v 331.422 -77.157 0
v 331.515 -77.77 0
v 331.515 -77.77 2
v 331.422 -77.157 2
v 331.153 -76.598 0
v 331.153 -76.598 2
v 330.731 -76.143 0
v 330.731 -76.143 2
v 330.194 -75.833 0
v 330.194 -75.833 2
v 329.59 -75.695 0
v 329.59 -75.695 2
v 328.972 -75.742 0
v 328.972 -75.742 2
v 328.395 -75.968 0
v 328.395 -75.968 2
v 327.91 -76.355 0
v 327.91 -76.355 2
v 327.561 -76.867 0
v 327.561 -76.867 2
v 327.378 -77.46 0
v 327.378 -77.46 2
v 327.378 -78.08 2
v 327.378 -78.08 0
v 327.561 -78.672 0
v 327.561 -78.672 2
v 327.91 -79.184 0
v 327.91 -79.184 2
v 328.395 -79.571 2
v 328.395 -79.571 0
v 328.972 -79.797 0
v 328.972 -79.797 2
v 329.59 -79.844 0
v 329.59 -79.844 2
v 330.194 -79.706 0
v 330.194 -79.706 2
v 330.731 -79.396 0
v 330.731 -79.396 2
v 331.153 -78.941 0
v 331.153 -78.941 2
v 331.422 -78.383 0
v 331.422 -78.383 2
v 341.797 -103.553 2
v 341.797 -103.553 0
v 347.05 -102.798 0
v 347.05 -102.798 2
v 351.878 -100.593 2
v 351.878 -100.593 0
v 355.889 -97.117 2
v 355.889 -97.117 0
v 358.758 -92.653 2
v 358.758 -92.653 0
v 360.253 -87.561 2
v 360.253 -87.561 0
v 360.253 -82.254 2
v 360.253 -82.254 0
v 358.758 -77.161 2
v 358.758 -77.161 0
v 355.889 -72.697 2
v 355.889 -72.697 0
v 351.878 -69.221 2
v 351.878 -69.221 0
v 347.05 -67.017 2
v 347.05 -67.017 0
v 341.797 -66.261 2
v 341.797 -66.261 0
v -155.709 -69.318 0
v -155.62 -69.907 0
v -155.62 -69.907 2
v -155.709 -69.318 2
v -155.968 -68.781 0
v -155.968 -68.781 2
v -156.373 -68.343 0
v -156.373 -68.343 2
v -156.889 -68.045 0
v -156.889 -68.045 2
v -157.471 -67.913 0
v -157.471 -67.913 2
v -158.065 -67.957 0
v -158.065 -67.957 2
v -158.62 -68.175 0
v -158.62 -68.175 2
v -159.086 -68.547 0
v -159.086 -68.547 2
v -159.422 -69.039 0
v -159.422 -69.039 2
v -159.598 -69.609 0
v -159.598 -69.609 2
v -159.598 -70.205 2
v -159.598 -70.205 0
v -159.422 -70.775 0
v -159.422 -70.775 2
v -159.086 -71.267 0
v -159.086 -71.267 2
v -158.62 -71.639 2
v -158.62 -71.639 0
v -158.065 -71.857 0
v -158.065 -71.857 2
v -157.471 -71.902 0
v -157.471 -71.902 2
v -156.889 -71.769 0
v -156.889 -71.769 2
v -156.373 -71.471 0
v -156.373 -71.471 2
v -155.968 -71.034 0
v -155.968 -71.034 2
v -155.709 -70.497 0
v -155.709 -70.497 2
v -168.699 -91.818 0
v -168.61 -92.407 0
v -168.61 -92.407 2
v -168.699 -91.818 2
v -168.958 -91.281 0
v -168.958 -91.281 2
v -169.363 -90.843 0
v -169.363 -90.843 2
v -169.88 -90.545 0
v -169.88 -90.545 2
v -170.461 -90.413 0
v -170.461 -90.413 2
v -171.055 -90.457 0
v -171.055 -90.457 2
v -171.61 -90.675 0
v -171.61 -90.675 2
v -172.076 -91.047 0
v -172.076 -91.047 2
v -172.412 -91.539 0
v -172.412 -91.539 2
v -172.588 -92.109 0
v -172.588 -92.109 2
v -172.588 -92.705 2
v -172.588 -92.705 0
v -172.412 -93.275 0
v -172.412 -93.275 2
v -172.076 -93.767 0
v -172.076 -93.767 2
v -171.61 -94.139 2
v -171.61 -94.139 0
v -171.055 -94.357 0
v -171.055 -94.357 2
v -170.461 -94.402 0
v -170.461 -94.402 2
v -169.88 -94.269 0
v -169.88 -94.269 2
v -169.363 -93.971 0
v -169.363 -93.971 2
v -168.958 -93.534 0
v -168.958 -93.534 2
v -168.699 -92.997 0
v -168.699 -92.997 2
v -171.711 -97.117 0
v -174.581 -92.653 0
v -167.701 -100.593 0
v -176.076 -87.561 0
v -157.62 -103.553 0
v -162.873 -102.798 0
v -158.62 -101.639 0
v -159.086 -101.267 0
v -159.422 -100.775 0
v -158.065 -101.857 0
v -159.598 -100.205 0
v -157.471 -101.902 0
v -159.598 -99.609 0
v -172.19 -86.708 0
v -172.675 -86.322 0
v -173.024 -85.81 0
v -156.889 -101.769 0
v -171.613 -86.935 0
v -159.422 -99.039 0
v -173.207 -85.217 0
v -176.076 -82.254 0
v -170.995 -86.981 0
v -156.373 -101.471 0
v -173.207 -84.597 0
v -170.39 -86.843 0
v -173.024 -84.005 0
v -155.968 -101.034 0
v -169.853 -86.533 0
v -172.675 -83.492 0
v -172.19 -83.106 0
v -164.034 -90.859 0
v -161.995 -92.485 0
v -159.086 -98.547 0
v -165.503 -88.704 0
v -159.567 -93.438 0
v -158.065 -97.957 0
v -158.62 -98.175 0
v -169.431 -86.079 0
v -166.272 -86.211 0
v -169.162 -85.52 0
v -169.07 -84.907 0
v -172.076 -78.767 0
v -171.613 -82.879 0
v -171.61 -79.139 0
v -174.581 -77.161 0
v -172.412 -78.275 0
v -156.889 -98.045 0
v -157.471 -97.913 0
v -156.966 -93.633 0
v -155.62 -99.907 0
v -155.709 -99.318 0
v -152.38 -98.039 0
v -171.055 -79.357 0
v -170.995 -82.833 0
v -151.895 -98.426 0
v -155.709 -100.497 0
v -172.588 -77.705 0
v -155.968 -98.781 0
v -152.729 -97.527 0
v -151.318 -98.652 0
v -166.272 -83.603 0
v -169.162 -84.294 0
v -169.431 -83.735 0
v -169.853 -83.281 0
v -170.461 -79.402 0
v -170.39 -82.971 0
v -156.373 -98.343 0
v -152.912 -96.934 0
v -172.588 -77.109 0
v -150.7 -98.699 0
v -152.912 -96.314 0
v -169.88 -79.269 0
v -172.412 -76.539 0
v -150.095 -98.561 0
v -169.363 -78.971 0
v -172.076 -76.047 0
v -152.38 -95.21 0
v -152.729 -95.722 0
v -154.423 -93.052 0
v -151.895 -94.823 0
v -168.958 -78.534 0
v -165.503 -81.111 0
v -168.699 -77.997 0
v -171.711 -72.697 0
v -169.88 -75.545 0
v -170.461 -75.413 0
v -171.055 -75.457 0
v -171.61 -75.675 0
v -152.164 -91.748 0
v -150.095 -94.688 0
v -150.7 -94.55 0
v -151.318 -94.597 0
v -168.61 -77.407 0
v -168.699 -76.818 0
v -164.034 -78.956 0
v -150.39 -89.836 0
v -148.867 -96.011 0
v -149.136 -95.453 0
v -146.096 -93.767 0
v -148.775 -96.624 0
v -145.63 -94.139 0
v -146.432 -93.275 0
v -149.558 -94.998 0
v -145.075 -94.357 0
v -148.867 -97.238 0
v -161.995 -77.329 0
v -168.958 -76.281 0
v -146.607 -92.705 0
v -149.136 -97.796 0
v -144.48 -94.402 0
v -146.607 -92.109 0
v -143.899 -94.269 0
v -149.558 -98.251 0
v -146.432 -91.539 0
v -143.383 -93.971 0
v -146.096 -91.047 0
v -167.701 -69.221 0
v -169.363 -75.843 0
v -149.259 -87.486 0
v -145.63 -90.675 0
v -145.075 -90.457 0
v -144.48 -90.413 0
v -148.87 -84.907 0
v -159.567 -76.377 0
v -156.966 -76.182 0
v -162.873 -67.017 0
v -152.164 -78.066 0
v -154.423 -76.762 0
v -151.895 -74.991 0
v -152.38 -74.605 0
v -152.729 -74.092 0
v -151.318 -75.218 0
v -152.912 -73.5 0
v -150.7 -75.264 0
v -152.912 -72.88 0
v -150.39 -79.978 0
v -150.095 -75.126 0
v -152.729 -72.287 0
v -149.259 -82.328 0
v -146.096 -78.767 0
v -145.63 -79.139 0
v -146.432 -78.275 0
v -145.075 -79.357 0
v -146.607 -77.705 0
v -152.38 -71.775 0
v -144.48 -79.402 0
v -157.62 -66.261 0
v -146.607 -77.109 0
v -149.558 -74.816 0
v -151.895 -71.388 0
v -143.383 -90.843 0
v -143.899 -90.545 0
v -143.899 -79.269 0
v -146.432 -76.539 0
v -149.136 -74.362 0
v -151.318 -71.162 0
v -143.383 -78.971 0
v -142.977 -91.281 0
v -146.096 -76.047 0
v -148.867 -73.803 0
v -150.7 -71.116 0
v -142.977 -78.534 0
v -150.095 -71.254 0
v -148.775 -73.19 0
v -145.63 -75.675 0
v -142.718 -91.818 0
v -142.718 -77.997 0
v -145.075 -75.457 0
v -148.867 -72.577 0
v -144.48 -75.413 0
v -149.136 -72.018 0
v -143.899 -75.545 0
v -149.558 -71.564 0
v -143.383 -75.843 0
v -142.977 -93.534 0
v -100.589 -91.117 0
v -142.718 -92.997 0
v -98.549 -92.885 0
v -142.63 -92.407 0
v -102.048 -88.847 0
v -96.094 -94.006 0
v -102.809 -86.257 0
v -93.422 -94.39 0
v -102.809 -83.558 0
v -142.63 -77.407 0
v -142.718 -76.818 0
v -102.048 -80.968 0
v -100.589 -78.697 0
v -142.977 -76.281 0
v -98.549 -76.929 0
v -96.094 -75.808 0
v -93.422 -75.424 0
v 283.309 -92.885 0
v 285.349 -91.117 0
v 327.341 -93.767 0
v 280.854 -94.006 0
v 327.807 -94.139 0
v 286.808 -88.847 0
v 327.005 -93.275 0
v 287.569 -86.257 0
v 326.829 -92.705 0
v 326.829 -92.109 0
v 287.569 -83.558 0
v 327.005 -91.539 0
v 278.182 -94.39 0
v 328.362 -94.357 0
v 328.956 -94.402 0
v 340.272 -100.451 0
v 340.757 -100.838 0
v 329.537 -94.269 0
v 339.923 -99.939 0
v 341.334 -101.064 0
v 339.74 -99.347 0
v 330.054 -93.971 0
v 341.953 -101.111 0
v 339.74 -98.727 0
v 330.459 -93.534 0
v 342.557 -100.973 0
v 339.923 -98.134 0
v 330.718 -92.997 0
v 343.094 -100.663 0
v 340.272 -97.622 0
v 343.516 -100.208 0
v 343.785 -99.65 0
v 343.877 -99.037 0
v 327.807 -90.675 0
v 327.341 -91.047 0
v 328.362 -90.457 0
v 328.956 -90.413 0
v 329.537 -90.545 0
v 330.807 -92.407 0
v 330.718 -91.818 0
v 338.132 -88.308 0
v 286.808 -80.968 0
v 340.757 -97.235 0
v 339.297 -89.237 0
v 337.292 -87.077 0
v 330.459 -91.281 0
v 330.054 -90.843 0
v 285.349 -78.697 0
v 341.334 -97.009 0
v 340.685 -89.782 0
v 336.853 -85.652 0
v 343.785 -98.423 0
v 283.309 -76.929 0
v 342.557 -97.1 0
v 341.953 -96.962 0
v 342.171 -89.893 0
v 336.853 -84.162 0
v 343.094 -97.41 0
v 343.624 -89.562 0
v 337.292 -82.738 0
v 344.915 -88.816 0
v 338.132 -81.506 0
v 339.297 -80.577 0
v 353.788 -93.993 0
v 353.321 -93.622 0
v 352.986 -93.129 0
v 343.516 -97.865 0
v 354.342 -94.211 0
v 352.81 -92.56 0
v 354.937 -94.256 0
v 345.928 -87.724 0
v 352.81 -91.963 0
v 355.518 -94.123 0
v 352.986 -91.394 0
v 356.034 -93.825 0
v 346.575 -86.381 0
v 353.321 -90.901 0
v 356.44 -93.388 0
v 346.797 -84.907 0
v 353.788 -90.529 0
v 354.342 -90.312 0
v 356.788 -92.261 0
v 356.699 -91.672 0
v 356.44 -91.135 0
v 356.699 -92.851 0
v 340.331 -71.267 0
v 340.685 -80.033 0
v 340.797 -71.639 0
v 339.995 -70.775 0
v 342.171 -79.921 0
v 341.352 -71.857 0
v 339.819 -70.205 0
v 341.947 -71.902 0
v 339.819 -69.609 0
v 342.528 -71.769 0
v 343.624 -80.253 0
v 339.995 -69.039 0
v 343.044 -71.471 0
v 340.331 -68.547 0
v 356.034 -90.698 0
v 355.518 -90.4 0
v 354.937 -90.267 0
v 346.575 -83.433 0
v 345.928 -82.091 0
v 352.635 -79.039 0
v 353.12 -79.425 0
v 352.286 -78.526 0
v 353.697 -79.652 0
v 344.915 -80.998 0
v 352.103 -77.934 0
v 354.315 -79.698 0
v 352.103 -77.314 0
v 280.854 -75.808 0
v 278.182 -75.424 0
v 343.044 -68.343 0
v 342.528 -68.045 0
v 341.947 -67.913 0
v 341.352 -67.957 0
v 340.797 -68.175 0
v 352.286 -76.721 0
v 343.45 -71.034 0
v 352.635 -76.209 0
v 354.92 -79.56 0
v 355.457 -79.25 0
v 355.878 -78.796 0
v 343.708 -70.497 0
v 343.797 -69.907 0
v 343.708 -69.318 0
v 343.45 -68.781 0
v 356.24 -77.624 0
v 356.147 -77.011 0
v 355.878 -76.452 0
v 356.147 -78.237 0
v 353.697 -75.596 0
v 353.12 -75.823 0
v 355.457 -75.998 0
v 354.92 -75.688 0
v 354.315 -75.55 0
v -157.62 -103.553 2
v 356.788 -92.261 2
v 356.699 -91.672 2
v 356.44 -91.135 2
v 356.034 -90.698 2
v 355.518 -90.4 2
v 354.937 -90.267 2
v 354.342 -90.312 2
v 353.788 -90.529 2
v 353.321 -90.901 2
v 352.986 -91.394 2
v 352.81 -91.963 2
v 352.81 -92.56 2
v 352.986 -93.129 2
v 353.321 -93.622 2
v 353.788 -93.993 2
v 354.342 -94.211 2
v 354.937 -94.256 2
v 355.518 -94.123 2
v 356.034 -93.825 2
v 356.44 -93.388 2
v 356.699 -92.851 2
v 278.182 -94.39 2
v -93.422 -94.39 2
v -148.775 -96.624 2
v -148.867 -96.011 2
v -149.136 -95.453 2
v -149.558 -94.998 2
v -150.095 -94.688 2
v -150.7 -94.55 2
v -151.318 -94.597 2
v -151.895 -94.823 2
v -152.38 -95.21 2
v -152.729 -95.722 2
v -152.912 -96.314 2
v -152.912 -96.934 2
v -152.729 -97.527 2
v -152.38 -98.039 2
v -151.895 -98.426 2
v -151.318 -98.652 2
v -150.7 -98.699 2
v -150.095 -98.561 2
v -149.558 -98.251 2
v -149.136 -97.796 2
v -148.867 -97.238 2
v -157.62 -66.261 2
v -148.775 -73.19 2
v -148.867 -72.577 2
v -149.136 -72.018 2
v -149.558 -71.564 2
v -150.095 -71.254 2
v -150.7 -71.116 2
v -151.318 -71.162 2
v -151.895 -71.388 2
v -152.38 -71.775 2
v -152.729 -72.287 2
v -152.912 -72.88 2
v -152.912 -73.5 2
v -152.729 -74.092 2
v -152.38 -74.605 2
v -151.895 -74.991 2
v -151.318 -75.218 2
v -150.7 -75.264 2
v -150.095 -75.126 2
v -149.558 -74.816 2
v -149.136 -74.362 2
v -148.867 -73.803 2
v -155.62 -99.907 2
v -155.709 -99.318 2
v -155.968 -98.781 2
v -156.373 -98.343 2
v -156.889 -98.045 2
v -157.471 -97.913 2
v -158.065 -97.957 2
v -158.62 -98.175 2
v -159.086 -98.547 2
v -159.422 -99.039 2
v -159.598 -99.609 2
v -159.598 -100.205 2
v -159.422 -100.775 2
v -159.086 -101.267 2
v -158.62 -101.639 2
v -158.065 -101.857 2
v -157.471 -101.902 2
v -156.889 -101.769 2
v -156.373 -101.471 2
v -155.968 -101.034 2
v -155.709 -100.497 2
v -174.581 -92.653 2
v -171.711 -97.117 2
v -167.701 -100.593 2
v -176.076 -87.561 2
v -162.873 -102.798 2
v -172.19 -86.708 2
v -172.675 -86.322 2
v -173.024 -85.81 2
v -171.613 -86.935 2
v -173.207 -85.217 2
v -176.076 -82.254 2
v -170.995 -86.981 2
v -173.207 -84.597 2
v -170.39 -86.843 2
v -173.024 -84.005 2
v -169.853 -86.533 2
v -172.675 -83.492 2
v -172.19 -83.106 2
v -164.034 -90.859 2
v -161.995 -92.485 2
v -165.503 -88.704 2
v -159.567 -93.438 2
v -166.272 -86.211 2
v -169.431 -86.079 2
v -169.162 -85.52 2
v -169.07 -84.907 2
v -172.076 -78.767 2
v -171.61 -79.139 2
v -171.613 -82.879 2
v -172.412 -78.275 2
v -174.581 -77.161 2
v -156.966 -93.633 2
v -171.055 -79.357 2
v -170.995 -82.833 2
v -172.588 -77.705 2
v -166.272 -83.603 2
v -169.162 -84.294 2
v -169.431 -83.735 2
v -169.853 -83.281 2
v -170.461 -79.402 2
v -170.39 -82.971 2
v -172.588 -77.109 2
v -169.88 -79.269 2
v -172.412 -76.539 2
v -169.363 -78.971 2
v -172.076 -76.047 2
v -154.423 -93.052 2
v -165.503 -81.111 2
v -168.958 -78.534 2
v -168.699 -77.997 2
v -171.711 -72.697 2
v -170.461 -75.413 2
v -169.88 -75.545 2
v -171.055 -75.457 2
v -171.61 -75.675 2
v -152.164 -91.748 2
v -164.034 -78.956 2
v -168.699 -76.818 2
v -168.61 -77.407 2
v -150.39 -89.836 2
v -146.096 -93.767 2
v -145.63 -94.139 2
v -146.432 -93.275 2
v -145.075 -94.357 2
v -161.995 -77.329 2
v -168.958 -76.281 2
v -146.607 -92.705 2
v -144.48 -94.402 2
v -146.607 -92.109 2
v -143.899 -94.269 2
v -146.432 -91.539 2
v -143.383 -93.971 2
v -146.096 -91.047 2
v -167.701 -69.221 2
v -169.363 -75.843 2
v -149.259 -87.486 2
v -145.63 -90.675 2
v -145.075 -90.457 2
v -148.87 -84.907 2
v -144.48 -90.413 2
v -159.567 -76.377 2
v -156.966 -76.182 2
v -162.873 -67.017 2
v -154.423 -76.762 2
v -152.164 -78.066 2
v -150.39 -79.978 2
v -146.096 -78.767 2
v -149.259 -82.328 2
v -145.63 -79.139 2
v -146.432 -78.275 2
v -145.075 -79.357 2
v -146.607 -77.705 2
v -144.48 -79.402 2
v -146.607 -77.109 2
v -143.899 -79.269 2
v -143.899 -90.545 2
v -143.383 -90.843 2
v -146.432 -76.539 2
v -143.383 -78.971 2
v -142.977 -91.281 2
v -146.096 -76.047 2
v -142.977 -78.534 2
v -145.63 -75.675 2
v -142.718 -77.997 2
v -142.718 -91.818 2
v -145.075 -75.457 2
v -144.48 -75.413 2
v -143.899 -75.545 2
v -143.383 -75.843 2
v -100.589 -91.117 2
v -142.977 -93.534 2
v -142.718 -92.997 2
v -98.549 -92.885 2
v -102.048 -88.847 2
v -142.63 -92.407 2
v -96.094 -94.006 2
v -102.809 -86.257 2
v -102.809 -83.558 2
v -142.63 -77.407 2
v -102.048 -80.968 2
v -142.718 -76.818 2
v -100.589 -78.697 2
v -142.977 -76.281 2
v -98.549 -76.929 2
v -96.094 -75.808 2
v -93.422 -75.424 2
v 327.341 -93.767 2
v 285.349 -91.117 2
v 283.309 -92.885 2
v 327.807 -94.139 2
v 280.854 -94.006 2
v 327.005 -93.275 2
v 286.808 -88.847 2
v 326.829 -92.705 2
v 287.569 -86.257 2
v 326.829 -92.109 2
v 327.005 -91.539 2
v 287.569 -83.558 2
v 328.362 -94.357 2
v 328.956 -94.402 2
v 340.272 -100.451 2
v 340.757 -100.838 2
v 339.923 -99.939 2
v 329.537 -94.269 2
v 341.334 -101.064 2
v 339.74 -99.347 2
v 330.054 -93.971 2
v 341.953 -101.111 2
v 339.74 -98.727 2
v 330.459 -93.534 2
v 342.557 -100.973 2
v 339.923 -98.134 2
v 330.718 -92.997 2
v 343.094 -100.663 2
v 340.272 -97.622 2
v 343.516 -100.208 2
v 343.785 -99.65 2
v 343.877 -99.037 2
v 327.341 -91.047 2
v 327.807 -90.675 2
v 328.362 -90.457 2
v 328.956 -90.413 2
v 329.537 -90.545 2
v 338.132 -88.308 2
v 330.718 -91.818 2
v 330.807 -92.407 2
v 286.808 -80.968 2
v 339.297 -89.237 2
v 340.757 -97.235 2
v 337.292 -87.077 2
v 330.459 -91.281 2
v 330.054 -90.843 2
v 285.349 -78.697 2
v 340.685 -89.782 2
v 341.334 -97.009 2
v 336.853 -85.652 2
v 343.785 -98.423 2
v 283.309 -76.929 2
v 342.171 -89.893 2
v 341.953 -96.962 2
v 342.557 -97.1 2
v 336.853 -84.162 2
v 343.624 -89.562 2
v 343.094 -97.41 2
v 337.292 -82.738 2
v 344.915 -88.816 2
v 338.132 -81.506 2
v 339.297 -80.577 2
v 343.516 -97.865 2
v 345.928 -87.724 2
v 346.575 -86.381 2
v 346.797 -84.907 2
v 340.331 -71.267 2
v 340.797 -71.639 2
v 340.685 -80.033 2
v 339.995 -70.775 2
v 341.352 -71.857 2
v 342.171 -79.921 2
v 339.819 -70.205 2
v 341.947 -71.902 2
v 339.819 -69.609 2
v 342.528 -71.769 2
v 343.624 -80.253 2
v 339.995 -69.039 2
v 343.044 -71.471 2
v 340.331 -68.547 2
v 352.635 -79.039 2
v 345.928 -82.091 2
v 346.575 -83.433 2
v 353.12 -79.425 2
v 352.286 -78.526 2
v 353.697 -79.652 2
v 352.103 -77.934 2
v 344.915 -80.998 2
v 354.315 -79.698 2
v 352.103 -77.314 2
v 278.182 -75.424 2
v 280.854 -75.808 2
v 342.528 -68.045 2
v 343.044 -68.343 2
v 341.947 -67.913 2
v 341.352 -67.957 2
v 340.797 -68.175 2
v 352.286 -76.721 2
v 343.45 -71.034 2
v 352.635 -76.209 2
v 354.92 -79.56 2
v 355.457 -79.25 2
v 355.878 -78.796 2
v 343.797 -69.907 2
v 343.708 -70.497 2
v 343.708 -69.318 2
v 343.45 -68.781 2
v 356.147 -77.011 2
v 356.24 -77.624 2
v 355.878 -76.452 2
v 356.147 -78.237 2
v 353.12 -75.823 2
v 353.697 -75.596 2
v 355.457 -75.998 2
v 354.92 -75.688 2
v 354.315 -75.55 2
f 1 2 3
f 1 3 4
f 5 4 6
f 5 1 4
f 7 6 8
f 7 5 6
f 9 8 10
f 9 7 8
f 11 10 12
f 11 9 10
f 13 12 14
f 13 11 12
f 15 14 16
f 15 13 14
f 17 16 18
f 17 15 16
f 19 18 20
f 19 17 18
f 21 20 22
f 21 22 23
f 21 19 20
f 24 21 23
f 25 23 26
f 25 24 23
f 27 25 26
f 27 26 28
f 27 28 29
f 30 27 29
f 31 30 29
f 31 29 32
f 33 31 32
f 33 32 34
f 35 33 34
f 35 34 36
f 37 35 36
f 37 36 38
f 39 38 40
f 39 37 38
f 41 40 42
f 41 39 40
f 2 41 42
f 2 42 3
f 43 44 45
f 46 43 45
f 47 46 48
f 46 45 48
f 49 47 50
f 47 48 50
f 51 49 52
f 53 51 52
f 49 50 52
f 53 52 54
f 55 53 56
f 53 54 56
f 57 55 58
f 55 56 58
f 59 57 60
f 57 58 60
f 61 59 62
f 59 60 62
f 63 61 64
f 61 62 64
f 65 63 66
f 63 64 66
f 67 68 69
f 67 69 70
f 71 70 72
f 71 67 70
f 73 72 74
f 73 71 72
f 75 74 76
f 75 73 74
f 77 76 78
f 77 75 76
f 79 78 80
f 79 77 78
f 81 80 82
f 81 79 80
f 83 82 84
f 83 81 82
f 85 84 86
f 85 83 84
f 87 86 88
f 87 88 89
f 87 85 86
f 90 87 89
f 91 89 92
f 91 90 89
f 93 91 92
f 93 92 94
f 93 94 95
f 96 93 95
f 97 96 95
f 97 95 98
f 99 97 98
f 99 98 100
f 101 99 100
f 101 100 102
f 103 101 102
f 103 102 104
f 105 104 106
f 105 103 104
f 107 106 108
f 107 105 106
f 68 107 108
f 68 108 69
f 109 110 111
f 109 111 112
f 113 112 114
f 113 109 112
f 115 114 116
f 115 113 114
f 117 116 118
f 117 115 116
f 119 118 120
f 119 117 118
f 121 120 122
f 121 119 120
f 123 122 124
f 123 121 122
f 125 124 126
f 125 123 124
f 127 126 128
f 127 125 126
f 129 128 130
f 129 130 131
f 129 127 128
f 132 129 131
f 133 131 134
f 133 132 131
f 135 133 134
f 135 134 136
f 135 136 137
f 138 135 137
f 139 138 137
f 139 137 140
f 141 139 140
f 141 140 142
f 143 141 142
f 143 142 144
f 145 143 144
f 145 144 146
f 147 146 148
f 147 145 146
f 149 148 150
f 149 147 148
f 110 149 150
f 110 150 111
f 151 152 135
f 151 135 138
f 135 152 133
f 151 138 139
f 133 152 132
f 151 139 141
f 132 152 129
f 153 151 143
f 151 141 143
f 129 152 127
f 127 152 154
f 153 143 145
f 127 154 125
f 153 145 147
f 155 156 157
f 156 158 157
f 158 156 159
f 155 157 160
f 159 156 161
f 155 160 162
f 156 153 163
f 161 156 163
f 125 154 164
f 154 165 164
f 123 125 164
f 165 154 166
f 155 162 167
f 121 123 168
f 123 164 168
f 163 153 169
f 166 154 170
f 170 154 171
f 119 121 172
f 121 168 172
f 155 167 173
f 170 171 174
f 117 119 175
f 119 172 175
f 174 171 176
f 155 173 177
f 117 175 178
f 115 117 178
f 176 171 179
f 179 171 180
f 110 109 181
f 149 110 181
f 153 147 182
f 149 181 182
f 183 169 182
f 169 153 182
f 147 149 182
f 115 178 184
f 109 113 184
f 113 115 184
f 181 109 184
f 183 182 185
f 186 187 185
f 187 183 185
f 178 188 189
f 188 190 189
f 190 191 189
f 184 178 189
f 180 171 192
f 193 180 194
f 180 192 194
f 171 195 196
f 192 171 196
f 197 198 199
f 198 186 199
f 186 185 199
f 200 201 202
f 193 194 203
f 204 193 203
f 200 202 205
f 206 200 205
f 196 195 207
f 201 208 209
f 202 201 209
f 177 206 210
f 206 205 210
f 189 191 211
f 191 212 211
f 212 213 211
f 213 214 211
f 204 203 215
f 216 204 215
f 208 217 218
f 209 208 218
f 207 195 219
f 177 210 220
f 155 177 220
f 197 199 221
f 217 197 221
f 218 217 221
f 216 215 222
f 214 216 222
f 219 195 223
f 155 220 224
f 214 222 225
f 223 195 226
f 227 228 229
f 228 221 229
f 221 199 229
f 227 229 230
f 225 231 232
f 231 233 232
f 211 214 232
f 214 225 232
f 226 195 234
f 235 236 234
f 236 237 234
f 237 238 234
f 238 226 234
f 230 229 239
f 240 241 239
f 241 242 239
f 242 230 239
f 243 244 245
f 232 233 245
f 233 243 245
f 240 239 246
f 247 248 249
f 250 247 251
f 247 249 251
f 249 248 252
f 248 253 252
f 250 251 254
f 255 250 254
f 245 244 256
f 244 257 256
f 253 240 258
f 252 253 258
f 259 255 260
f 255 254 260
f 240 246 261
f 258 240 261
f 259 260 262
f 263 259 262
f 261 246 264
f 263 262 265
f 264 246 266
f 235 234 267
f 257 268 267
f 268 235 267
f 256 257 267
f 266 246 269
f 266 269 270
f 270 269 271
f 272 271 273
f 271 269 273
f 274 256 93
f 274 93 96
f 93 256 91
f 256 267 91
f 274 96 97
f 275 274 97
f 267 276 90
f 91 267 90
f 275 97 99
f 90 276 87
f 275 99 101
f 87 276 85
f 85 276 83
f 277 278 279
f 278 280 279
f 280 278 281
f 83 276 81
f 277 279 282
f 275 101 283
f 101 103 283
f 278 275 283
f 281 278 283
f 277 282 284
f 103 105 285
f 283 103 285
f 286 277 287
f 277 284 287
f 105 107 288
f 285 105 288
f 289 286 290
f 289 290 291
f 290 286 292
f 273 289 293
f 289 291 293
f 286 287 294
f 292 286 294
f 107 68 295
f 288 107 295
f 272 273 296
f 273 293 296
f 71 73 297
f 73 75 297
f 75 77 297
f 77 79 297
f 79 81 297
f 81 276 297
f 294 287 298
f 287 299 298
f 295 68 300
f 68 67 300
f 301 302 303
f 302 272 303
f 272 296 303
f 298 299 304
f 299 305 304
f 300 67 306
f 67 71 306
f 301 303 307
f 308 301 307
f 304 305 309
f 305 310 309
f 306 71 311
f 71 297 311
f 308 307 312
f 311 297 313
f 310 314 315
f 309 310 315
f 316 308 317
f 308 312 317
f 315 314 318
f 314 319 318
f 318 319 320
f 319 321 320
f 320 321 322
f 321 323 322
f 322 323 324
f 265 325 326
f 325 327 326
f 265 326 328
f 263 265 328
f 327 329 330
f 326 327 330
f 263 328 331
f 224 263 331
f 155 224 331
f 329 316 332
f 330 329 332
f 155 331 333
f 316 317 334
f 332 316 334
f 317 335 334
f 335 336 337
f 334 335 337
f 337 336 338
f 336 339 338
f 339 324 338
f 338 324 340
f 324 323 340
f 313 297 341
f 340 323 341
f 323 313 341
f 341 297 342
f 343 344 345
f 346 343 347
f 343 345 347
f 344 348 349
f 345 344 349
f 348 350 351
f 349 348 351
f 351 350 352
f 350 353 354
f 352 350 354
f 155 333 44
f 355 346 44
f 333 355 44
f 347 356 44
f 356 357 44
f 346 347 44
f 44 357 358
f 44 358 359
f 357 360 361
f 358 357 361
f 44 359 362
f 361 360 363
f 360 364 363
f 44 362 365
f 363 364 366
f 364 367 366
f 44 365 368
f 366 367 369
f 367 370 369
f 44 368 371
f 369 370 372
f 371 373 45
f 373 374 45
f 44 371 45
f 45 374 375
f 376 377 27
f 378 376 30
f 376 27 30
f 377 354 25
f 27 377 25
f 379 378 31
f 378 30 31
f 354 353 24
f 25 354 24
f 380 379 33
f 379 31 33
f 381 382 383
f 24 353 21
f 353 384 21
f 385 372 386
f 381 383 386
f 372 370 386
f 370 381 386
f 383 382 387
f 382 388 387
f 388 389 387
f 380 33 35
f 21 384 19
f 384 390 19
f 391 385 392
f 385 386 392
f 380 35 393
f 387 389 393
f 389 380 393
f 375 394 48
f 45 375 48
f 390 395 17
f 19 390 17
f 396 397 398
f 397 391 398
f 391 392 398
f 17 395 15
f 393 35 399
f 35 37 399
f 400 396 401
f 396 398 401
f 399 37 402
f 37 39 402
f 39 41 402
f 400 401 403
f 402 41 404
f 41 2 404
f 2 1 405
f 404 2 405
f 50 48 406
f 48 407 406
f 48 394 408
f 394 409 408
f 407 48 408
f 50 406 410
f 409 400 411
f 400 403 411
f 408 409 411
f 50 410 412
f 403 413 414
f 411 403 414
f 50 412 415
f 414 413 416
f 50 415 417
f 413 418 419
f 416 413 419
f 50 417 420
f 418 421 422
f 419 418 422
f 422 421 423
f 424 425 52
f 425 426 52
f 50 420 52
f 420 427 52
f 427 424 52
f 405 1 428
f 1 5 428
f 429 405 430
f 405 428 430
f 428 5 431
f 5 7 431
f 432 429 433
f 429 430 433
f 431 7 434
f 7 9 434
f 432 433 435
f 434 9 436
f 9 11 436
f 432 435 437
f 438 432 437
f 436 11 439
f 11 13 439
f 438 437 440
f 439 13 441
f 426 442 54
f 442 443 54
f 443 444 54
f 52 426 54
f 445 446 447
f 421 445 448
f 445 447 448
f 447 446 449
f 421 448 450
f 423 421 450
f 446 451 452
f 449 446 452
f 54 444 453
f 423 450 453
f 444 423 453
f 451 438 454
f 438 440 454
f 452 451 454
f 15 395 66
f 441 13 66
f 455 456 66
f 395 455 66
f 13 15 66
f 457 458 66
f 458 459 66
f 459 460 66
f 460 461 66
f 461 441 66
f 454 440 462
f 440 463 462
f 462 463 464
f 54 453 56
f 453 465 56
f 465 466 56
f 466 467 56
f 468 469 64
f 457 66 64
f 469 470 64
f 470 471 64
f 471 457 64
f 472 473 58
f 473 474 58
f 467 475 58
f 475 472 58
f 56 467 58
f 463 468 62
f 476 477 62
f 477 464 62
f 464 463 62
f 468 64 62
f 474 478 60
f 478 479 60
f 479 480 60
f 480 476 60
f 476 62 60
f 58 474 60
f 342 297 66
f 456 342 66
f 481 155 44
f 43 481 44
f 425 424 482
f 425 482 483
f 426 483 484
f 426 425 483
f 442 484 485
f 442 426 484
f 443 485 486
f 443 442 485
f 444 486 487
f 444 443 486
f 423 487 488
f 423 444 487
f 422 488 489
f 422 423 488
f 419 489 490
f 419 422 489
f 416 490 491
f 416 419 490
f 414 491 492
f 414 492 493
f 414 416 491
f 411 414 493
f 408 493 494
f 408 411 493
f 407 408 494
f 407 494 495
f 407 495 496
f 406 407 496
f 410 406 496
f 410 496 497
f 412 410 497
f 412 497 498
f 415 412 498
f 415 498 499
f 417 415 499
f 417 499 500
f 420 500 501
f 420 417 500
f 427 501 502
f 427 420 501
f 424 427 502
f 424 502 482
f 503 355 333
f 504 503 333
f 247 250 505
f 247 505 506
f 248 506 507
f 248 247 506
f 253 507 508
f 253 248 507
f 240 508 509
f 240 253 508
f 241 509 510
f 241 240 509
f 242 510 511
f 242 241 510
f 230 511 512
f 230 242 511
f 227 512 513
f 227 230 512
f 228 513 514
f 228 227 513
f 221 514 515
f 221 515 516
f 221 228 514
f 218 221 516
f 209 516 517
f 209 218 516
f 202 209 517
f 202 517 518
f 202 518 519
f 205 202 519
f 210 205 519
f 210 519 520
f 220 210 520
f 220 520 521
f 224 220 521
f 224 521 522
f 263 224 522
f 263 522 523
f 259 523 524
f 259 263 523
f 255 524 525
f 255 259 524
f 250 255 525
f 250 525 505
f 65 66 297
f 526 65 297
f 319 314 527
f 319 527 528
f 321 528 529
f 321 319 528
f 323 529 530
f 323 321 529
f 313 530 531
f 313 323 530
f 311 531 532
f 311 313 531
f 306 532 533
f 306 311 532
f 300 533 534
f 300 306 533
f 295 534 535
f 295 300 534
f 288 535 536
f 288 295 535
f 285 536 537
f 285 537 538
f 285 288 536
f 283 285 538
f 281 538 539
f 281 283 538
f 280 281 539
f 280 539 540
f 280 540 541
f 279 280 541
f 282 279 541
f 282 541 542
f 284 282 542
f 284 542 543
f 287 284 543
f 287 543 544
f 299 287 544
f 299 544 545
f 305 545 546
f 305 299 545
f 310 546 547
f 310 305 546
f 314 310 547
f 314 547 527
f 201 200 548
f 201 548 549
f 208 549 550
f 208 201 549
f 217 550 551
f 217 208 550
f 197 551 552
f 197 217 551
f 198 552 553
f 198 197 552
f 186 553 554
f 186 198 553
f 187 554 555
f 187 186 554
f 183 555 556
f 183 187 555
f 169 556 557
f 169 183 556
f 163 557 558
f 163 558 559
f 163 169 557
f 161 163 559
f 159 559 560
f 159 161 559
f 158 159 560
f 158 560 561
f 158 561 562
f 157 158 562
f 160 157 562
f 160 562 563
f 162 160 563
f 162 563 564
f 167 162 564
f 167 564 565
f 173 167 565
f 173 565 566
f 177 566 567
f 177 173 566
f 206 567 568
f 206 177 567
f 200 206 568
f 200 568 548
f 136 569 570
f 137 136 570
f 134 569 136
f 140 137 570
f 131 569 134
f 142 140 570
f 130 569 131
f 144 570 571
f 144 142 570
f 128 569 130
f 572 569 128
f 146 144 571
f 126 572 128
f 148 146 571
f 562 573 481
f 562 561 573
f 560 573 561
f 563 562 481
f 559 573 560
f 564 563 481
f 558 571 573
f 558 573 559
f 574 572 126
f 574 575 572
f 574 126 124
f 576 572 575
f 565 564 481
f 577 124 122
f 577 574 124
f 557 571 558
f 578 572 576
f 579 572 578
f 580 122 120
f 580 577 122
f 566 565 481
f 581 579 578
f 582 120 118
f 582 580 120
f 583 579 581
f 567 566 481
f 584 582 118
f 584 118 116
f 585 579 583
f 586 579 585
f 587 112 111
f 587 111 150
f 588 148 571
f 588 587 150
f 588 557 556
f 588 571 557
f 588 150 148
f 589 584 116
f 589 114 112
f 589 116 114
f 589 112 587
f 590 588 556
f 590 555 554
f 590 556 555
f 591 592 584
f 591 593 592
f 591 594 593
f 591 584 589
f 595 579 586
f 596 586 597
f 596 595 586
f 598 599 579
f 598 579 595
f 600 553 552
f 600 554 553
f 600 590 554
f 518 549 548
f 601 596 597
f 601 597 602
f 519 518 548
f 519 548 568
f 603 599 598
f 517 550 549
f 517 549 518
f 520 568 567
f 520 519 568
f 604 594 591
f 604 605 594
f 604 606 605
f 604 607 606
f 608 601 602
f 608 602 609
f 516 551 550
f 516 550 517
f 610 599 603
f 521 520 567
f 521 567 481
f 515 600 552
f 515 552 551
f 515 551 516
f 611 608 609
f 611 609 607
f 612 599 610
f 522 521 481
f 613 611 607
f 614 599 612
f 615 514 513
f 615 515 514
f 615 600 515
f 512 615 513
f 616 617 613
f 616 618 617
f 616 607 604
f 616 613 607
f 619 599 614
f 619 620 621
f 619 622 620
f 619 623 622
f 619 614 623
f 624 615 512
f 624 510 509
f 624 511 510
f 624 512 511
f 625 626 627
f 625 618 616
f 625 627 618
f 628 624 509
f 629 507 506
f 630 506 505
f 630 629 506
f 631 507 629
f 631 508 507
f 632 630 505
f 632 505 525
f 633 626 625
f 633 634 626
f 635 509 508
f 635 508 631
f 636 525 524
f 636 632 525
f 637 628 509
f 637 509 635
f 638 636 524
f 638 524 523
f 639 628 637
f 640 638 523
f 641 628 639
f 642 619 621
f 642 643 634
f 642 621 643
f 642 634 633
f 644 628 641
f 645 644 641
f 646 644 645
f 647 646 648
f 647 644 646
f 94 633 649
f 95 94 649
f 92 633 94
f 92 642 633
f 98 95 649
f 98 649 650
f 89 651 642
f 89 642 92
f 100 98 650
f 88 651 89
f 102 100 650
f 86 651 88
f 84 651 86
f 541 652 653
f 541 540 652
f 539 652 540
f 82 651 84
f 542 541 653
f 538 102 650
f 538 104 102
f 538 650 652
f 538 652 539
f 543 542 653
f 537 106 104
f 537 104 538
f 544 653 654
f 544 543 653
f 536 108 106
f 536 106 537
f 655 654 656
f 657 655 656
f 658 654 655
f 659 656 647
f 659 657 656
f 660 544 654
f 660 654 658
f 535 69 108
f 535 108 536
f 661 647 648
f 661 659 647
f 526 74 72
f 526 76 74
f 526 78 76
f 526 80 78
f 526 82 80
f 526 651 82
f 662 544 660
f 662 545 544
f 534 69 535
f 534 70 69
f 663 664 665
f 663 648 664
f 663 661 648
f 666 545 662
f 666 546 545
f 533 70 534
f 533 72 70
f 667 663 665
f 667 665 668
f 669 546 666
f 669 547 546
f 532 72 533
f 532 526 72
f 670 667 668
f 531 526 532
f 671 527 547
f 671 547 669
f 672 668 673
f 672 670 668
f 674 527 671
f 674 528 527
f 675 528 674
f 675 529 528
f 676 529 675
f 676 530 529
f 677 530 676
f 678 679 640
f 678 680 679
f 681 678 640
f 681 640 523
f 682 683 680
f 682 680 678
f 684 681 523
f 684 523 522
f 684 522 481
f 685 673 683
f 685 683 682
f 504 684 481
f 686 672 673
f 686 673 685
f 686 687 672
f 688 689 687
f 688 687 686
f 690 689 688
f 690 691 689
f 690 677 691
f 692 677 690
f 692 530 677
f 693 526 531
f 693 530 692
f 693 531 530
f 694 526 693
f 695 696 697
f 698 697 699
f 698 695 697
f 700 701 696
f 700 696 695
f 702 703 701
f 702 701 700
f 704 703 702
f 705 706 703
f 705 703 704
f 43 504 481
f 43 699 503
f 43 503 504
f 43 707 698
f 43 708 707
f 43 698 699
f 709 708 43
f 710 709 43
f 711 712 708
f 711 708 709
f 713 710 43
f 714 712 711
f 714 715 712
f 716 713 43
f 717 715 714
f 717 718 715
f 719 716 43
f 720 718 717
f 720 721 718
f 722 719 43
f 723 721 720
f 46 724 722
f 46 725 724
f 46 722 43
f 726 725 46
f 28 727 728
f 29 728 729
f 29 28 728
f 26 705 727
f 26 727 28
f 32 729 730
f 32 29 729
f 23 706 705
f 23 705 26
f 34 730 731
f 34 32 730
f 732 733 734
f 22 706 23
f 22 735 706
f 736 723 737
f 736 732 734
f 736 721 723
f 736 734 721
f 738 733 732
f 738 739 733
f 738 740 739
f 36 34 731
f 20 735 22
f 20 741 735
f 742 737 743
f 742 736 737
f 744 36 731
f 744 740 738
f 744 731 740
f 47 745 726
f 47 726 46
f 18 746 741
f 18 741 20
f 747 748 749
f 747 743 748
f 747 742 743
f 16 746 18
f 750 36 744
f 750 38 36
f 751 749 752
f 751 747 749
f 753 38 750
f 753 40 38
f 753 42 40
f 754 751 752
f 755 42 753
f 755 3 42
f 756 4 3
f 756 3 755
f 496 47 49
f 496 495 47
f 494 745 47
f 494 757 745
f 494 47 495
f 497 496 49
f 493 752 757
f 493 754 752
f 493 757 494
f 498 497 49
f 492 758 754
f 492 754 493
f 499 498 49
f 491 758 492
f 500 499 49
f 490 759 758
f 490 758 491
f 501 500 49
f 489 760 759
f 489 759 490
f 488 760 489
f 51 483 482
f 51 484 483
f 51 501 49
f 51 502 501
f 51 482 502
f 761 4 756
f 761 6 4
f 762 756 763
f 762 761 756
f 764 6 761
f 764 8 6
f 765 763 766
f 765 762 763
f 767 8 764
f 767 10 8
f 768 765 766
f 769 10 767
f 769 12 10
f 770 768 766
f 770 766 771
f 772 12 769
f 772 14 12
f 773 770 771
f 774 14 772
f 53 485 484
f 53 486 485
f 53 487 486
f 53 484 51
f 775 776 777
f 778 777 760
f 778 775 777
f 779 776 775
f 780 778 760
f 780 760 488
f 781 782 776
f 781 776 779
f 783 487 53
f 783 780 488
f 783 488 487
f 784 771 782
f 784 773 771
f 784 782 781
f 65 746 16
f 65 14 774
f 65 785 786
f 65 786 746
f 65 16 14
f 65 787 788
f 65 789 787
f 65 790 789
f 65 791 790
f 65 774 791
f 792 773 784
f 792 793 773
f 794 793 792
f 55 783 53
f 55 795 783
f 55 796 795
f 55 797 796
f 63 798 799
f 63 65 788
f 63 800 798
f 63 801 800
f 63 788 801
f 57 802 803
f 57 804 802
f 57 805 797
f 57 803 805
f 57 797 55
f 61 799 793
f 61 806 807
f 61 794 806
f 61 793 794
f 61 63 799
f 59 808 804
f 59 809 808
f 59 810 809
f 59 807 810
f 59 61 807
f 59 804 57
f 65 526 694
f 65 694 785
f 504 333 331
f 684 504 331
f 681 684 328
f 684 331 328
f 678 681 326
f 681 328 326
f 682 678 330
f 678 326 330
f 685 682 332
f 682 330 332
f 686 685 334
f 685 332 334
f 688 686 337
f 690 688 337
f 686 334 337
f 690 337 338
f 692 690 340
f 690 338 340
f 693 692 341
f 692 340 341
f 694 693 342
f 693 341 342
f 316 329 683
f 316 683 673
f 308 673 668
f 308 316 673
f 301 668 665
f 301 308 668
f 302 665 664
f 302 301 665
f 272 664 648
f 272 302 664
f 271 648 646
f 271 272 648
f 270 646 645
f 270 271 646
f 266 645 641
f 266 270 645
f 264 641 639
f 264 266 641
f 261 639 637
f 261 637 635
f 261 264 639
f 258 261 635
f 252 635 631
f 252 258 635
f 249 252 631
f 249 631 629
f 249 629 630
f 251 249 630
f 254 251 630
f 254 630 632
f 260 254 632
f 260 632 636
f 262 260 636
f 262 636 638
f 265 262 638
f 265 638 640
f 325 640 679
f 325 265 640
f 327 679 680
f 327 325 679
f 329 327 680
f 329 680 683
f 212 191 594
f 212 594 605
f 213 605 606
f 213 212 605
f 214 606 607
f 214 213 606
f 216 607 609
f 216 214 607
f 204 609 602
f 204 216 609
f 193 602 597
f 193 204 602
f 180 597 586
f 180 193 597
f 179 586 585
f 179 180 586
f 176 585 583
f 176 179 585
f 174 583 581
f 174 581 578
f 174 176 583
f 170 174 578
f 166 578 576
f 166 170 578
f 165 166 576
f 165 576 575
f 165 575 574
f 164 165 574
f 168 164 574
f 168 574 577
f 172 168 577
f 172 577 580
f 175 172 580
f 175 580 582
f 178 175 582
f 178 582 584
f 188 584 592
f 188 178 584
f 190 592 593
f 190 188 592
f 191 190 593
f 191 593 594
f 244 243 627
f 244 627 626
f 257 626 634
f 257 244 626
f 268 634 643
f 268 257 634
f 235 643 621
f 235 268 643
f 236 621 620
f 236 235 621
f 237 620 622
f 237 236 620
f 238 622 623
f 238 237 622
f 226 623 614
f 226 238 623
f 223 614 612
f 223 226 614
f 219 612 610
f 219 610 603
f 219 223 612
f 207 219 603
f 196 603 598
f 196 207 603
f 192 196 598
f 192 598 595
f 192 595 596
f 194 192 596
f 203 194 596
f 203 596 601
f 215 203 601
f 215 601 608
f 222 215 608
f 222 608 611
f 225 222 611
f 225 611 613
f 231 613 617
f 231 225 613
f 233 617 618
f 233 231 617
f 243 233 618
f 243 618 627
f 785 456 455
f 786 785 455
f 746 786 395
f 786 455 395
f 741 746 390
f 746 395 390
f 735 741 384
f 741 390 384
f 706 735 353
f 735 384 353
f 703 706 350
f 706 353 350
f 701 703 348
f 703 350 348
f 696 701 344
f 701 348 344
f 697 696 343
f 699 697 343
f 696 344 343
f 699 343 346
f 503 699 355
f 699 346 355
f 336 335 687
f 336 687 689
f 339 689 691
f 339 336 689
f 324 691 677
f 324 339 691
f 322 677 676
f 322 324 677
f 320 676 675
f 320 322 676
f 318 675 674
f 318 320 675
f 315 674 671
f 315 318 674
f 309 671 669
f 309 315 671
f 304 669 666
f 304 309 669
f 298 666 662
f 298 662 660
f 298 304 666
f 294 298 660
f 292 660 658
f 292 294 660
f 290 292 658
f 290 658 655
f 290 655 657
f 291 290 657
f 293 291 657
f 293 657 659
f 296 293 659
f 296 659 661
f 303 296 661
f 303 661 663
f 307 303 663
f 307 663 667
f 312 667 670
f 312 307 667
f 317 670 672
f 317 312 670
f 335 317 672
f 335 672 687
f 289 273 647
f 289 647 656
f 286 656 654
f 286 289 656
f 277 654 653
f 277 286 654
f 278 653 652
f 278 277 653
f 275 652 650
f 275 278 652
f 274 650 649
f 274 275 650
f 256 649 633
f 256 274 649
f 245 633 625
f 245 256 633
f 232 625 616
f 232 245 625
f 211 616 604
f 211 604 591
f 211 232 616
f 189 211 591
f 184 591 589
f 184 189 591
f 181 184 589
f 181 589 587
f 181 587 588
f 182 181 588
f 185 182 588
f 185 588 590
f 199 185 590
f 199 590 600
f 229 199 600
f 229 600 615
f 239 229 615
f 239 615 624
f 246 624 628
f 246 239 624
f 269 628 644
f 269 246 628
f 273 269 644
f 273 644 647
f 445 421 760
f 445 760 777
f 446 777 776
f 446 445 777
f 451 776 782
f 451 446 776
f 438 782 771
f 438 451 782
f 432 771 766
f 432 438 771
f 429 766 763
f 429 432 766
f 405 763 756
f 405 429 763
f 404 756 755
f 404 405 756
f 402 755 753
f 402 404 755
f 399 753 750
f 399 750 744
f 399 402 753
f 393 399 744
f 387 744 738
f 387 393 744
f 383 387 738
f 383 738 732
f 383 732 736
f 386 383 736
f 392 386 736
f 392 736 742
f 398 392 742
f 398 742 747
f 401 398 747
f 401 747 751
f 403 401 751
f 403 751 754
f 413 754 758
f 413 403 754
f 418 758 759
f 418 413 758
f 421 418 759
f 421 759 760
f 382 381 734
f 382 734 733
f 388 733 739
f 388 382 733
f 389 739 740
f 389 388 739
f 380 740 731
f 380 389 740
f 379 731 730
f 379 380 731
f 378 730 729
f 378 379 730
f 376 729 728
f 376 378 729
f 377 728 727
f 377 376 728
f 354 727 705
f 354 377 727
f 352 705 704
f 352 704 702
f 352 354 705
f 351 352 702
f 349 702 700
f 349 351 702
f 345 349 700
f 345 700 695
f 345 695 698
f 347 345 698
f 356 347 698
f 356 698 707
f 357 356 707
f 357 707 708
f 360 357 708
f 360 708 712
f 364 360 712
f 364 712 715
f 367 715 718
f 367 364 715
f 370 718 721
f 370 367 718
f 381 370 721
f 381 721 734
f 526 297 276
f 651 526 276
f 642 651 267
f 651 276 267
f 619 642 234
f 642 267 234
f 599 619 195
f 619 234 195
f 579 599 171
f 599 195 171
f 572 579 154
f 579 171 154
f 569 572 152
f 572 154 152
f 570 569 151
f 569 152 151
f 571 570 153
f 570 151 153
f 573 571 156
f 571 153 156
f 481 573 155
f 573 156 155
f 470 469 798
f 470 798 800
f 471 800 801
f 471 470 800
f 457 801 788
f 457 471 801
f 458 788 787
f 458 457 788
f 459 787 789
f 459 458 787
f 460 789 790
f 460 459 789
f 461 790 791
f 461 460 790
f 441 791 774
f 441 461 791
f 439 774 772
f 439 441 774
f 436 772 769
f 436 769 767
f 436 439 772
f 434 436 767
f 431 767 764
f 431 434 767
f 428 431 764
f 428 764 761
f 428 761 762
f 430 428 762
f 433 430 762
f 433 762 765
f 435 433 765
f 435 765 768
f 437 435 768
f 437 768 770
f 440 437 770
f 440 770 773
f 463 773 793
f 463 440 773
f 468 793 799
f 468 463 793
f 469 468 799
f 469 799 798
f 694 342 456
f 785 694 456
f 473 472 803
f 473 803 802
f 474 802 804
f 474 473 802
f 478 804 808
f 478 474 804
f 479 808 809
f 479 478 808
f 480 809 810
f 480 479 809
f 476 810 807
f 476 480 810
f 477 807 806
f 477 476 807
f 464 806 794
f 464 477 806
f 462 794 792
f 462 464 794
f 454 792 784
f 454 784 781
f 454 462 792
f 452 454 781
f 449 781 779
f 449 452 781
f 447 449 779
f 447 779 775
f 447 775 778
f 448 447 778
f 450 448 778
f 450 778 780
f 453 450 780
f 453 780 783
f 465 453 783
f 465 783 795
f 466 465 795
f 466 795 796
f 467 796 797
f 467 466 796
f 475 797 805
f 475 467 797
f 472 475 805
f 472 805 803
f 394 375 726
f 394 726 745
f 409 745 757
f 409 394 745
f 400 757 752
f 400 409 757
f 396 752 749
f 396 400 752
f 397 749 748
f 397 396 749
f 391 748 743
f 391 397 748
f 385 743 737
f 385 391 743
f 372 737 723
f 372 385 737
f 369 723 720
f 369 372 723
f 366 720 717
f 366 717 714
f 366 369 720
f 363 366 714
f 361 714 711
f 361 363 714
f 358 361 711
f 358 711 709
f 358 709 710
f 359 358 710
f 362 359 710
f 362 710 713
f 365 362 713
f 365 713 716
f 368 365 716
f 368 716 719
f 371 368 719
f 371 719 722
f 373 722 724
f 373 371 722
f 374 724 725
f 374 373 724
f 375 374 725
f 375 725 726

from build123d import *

# Parameters (mm, degrees)
SKETCH_1_R      = 5
SKETCH_1_R_2    = 2
SKETCH_1_R_3    = 2.08
SKETCH_1_R_4    = 8.75
EXTRUDE_1_DEPTH = 2


with BuildPart() as part:
    # 草图1 → 凸台-拉伸1 (new body)
    with BuildSketch(Plane.XY):
        with BuildLine():
            Line((341.797136251, -66.261433116), (-157.620006606, -66.261433116))
            ThreePointArc((-157.620006606, -66.261433116), (-176.265720892, -84.907147401), (-157.620006606, -103.552861687))
            Line((-157.620006606, -103.552861687), (341.797136251, -103.552861687))
            ThreePointArc((341.797136251, -103.552861687), (360.442850537, -84.907147401), (341.797136251, -66.261433116))
        make_face()
        with Locations((341.797136251, -84.907147401)):
            Circle(SKETCH_1_R, mode=Mode.SUBTRACT)
        with Locations((341.797136251, -69.907147401)):
            Circle(SKETCH_1_R_2, mode=Mode.SUBTRACT)
        with Locations((354.787517308, -92.261433116)):
            Circle(SKETCH_1_R_2, mode=Mode.SUBTRACT)
        with Locations((328.806755195, -92.407147401)):
            Circle(SKETCH_1_R_2, mode=Mode.SUBTRACT)
        with Locations((329.434548711, -77.769604157)):
            Circle(SKETCH_1_R_3, mode=Mode.SUBTRACT)
        with Locations((354.159723792, -77.623889871)):
            Circle(SKETCH_1_R_3, mode=Mode.SUBTRACT)
        with Locations((341.797136251, -99.036519604)):
            Circle(SKETCH_1_R_3, mode=Mode.SUBTRACT)
        with Locations((-157.620006606, -99.907147401)):
            Circle(SKETCH_1_R_2, mode=Mode.SUBTRACT)
        with Locations((-170.610387663, -92.407147401)):
            Circle(SKETCH_1_R_2, mode=Mode.SUBTRACT)
        with Locations((-170.610387663, -77.407147401)):
            Circle(SKETCH_1_R_2, mode=Mode.SUBTRACT)
        with Locations((-157.620006606, -69.907147401)):
            Circle(SKETCH_1_R_2, mode=Mode.SUBTRACT)
        with Locations((-144.629625549, -77.407147401)):
            Circle(SKETCH_1_R_2, mode=Mode.SUBTRACT)
        with Locations((-144.629625549, -92.407147401)):
            Circle(SKETCH_1_R_2, mode=Mode.SUBTRACT)
        with Locations((-171.150006606, -84.907147401)):
            Circle(SKETCH_1_R_3, mode=Mode.SUBTRACT)
        with Locations((-150.855006606, -73.189823688)):
            Circle(SKETCH_1_R_3, mode=Mode.SUBTRACT)
        with Locations((-150.855006606, -96.624471115)):
            Circle(SKETCH_1_R_3, mode=Mode.SUBTRACT)
        with Locations((-157.620006606, -84.907147401)):
            Circle(SKETCH_1_R_4, mode=Mode.SUBTRACT)
        with BuildLine():
            Line((-93.421962488, -75.424045387), (278.181949277, -75.424045387))
            ThreePointArc((278.181949277, -75.424045387), (287.665051291, -84.907147401), (278.181949277, -94.390249416))
            Line((278.181949277, -94.390249416), (-93.421962488, -94.390249416))
            ThreePointArc((-93.421962488, -94.390249416), (-102.905064503, -84.907147401), (-93.421962488, -75.424045387))
        make_face(mode=Mode.SUBTRACT)
    extrude(amount=EXTRUDE_1_DEPTH)


solid = part.part
